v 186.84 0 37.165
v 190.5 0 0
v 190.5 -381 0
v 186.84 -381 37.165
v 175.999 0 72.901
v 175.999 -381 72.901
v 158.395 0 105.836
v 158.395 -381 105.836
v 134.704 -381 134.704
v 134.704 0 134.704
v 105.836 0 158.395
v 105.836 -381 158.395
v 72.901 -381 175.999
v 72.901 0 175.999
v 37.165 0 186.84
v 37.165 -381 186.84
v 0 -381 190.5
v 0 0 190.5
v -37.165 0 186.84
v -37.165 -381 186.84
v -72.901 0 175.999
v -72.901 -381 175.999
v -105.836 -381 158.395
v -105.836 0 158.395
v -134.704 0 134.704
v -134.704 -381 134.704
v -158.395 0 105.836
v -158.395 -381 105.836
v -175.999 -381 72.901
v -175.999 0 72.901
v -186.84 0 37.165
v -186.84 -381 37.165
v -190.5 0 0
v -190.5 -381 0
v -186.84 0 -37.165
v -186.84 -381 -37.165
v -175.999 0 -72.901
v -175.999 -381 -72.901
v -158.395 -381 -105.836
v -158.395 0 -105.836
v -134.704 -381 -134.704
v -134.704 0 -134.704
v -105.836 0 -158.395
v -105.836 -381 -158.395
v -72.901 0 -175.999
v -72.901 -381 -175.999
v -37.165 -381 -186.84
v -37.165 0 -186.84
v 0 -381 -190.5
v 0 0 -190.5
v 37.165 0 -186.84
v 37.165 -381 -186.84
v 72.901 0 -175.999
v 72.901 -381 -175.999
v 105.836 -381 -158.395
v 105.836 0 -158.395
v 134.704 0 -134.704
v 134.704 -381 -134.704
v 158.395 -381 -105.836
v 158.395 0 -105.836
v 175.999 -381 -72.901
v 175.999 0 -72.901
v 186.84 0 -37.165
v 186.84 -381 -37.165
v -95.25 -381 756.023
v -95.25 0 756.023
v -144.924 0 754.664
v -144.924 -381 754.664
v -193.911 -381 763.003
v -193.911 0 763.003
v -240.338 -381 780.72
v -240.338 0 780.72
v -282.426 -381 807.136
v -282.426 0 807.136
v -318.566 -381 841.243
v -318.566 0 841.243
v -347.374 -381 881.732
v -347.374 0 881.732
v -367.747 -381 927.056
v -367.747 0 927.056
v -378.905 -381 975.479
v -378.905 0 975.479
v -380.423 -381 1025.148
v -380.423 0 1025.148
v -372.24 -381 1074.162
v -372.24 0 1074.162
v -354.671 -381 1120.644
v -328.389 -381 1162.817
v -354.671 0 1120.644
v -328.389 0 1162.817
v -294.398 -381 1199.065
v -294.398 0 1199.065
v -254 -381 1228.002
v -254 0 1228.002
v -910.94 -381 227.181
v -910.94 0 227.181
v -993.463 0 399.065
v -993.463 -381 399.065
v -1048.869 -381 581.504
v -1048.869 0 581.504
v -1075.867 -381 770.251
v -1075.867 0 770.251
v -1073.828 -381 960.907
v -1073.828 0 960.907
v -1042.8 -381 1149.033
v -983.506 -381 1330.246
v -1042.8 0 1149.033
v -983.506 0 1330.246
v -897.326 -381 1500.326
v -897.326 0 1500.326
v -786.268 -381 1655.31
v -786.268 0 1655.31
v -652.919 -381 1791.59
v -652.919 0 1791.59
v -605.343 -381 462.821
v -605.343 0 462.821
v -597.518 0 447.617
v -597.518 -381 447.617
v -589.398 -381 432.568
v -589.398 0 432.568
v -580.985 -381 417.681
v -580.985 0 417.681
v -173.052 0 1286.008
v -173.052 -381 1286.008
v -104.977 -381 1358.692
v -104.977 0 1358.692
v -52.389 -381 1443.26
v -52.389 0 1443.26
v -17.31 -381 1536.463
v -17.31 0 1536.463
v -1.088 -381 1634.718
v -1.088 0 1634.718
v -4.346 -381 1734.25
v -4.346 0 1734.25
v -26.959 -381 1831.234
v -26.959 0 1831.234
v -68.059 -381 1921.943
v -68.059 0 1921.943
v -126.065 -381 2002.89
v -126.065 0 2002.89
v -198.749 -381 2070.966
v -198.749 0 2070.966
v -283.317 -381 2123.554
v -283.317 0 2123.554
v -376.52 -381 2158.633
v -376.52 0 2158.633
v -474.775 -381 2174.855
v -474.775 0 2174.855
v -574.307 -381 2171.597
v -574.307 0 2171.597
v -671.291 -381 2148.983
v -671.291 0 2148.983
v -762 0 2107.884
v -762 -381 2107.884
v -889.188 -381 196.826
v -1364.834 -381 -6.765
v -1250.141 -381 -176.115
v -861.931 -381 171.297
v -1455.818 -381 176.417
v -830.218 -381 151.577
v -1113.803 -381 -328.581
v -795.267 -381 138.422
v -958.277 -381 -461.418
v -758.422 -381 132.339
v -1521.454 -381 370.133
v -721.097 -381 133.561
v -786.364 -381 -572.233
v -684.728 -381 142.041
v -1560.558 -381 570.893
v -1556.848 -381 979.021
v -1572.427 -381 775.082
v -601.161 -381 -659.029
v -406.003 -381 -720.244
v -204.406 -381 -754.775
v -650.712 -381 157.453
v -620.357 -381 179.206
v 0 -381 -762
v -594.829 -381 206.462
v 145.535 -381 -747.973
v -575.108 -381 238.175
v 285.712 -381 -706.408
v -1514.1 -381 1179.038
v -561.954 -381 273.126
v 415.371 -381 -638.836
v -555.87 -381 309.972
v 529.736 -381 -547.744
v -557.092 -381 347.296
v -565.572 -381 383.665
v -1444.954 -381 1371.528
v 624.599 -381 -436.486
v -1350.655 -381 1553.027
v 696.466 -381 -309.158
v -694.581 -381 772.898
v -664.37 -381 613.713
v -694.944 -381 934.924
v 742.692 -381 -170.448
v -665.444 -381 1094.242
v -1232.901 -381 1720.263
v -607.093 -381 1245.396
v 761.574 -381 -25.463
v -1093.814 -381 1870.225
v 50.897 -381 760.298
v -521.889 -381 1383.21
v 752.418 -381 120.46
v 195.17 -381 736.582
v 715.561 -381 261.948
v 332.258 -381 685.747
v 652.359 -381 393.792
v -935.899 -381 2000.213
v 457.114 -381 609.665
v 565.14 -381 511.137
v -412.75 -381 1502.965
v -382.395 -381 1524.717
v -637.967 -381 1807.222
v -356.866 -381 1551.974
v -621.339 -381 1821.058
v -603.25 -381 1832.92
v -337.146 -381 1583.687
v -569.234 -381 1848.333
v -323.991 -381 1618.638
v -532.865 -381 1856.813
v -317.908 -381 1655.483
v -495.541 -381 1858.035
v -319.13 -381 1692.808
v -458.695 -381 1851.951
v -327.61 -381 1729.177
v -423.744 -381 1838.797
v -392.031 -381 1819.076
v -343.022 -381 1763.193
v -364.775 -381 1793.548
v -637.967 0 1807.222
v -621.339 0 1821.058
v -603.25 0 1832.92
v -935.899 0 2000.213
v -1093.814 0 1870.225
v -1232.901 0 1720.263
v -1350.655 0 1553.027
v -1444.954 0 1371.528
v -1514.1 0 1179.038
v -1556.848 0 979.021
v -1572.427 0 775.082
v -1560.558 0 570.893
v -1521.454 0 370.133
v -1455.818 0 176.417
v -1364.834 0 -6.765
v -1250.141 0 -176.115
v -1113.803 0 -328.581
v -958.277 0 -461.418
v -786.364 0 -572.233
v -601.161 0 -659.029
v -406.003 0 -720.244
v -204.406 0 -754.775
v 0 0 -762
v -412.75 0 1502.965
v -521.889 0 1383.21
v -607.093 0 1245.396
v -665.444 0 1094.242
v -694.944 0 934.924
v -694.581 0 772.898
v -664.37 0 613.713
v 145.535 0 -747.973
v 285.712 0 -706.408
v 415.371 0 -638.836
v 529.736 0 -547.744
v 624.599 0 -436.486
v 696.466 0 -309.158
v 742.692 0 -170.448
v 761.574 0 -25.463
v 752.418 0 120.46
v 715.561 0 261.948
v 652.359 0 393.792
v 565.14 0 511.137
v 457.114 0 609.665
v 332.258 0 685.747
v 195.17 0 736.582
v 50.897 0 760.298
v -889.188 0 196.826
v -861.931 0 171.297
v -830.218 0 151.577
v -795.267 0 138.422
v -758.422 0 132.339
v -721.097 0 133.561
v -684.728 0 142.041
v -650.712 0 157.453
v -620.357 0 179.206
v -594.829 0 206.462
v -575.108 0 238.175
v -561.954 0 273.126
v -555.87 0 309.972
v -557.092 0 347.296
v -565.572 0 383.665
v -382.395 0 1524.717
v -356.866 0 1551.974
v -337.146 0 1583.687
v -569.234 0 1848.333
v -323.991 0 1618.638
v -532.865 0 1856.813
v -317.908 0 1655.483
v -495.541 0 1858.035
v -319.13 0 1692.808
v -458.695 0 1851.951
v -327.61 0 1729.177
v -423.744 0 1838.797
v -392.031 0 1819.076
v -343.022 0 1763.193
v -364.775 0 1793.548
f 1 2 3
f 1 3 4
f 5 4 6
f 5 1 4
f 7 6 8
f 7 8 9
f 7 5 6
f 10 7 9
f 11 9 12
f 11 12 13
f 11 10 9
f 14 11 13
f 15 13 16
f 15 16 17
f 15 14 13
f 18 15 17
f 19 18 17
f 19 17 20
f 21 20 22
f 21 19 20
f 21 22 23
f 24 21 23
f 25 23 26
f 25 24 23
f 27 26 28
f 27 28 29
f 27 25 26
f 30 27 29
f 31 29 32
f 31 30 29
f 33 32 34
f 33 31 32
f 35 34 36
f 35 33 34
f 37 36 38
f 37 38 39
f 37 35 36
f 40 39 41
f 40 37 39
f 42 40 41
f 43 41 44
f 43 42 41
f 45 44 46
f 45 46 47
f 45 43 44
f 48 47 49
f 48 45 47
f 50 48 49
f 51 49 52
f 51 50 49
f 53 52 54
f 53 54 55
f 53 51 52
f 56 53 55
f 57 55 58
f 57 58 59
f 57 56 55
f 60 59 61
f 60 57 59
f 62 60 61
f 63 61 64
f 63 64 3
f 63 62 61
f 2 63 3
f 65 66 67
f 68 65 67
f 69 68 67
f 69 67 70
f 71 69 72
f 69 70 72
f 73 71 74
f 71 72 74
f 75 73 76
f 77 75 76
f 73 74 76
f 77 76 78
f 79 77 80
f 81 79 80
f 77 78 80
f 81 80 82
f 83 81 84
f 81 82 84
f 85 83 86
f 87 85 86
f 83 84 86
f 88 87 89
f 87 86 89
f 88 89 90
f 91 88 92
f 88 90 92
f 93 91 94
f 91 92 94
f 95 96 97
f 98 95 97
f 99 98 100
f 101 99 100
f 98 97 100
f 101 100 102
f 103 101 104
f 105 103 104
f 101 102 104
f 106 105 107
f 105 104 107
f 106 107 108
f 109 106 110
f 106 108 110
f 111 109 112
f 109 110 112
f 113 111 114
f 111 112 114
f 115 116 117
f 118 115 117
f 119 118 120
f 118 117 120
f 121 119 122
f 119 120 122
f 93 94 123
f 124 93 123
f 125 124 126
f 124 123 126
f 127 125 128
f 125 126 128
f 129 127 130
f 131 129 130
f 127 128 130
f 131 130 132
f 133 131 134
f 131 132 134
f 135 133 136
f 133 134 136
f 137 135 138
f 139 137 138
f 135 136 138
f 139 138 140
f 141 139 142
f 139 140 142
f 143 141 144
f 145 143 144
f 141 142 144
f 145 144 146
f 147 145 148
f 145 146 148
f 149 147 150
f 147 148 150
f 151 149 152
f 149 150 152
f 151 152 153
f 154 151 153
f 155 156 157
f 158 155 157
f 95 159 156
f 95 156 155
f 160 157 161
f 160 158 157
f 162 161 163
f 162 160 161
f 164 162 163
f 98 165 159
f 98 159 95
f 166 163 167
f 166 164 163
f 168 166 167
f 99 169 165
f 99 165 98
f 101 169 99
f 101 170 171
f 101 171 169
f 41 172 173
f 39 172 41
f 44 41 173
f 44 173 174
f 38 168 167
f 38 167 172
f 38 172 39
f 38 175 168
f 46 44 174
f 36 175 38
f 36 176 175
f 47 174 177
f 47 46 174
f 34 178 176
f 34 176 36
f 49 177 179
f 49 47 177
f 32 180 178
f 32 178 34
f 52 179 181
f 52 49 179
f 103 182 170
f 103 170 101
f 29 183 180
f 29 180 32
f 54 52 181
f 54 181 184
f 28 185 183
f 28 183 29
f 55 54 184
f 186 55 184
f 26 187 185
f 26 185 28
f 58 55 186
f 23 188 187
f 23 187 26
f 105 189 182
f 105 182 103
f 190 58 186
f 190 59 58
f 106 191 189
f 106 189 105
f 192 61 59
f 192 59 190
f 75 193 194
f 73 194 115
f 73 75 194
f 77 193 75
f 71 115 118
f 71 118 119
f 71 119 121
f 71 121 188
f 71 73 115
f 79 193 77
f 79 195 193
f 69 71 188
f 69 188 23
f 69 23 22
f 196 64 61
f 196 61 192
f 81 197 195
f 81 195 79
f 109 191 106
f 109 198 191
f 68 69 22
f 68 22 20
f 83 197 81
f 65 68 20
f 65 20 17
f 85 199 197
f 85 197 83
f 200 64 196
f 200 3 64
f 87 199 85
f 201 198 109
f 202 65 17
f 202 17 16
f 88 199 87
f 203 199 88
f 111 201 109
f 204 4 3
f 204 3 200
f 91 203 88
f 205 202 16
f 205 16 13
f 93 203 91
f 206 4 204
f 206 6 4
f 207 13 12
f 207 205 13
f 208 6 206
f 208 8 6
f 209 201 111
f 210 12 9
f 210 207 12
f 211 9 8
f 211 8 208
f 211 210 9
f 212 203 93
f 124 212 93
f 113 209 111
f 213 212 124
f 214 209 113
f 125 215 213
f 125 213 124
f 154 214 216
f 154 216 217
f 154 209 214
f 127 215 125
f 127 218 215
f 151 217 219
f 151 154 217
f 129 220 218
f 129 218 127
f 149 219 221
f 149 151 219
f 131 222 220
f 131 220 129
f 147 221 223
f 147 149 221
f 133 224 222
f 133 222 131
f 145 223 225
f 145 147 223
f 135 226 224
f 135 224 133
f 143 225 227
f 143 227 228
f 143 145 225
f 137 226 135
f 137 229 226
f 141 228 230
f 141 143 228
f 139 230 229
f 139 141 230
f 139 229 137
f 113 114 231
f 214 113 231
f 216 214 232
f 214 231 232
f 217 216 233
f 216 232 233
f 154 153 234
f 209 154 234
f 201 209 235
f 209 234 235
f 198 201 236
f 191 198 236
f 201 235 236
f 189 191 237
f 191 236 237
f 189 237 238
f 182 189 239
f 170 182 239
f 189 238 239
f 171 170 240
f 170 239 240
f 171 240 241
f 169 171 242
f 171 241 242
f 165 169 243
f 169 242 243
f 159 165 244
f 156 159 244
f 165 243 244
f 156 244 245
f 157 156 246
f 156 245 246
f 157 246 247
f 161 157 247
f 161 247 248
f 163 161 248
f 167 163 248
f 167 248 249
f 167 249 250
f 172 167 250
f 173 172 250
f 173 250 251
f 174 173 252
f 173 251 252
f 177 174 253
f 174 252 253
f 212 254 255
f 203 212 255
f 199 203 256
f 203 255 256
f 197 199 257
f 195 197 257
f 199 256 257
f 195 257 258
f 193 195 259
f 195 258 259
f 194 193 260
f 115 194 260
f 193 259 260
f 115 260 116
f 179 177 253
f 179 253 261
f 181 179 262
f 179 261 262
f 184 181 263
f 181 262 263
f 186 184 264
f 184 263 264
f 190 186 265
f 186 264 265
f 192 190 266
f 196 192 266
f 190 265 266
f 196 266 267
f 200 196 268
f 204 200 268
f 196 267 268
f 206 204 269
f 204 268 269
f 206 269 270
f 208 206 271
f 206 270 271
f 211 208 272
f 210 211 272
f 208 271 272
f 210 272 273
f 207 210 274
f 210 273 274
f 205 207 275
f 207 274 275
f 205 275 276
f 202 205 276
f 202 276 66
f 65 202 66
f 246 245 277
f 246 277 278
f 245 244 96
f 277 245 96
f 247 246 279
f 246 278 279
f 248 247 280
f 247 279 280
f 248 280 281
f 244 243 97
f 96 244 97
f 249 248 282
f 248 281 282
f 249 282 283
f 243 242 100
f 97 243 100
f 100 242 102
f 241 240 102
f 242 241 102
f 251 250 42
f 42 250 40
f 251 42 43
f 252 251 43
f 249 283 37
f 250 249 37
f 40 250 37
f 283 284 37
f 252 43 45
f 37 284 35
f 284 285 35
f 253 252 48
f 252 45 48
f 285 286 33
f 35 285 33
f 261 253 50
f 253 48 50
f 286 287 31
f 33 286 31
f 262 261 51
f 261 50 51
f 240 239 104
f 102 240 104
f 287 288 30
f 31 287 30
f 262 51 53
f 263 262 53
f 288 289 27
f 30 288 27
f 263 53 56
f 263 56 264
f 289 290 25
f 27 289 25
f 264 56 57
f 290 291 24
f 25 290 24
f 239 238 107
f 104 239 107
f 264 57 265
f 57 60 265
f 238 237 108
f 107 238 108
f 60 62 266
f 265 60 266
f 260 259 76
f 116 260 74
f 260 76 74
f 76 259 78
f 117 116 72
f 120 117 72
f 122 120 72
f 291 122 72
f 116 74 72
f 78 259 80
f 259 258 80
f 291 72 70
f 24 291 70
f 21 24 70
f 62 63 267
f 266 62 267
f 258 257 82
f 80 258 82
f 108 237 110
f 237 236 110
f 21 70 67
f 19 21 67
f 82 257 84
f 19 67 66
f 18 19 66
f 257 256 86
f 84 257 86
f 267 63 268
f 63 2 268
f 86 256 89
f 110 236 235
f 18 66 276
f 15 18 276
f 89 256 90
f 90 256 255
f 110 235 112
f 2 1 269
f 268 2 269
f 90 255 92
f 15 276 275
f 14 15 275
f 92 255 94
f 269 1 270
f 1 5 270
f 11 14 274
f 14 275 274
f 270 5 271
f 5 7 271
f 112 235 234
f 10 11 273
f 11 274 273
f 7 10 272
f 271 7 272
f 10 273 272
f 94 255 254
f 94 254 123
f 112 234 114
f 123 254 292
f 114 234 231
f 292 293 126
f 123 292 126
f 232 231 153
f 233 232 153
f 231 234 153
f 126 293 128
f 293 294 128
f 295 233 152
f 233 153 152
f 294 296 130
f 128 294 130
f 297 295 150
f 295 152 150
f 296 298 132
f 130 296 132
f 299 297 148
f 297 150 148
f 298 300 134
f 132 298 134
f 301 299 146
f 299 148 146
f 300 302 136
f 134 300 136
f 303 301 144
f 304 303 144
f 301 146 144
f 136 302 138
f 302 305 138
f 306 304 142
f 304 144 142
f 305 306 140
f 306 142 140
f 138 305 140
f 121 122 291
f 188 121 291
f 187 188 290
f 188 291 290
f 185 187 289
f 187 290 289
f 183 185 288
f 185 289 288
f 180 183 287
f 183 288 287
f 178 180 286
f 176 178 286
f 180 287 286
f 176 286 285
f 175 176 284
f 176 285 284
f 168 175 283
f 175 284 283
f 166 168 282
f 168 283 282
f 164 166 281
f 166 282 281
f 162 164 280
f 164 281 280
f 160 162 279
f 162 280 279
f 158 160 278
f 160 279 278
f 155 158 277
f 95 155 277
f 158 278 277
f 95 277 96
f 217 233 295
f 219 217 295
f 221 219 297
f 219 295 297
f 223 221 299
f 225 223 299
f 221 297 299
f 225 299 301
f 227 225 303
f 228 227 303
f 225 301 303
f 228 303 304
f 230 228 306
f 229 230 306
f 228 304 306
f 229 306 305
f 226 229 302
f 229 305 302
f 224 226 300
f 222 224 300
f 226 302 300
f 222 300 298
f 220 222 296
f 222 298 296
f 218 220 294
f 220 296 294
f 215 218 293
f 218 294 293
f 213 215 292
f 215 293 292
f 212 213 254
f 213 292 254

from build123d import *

# Parameters (mm, degrees)
F0_R     = 190.5
F1_DEPTH = 381


with BuildPart() as f1:
    # F0 (on Front) → F1 (new body)
    with BuildSketch(Plane.XZ):
        with BuildLine():
            ThreePointArc((-762, 2107.883512), (-1521.453568, 370.133083), (0, -762))
            ThreePointArc((0, -762), (760.504392, 47.718659), (-95.25, 756.023437))
            ThreePointArc((-95.25, 756.023437), (-367.746778, 927.056014), (-254, 1228.001702))
            ThreePointArc((-254, 1228.001702), (-68.059095, 1921.942607), (-762, 2107.883512))
        make_face()
        Circle(F0_R, mode=Mode.SUBTRACT)
        with BuildLine():
            ThreePointArc((-603.25, 1832.920447), (-343.022161, 1763.192607), (-412.75, 1502.964768))
            ThreePointArc((-412.75, 1502.964768), (-683.887287, 1015.266582), (-605.343239, 462.821308))
            ThreePointArc((-605.343239, 462.821308), (-593.494545, 440.07278), (-580.984582, 417.681087))
            ThreePointArc((-580.984582, 417.681087), (-650.712421, 157.453248), (-910.940261, 227.181087))
            ThreePointArc((-910.940261, 227.181087), (-1061.908275, 1055.562788), (-652.919406, 1791.589749))
            ThreePointArc((-652.919406, 1791.589749), (-629.849877, 1814.376406), (-603.25, 1832.920447))
        make_face(mode=Mode.SUBTRACT)
    extrude(amount=F1_DEPTH)


solid = f1.part
